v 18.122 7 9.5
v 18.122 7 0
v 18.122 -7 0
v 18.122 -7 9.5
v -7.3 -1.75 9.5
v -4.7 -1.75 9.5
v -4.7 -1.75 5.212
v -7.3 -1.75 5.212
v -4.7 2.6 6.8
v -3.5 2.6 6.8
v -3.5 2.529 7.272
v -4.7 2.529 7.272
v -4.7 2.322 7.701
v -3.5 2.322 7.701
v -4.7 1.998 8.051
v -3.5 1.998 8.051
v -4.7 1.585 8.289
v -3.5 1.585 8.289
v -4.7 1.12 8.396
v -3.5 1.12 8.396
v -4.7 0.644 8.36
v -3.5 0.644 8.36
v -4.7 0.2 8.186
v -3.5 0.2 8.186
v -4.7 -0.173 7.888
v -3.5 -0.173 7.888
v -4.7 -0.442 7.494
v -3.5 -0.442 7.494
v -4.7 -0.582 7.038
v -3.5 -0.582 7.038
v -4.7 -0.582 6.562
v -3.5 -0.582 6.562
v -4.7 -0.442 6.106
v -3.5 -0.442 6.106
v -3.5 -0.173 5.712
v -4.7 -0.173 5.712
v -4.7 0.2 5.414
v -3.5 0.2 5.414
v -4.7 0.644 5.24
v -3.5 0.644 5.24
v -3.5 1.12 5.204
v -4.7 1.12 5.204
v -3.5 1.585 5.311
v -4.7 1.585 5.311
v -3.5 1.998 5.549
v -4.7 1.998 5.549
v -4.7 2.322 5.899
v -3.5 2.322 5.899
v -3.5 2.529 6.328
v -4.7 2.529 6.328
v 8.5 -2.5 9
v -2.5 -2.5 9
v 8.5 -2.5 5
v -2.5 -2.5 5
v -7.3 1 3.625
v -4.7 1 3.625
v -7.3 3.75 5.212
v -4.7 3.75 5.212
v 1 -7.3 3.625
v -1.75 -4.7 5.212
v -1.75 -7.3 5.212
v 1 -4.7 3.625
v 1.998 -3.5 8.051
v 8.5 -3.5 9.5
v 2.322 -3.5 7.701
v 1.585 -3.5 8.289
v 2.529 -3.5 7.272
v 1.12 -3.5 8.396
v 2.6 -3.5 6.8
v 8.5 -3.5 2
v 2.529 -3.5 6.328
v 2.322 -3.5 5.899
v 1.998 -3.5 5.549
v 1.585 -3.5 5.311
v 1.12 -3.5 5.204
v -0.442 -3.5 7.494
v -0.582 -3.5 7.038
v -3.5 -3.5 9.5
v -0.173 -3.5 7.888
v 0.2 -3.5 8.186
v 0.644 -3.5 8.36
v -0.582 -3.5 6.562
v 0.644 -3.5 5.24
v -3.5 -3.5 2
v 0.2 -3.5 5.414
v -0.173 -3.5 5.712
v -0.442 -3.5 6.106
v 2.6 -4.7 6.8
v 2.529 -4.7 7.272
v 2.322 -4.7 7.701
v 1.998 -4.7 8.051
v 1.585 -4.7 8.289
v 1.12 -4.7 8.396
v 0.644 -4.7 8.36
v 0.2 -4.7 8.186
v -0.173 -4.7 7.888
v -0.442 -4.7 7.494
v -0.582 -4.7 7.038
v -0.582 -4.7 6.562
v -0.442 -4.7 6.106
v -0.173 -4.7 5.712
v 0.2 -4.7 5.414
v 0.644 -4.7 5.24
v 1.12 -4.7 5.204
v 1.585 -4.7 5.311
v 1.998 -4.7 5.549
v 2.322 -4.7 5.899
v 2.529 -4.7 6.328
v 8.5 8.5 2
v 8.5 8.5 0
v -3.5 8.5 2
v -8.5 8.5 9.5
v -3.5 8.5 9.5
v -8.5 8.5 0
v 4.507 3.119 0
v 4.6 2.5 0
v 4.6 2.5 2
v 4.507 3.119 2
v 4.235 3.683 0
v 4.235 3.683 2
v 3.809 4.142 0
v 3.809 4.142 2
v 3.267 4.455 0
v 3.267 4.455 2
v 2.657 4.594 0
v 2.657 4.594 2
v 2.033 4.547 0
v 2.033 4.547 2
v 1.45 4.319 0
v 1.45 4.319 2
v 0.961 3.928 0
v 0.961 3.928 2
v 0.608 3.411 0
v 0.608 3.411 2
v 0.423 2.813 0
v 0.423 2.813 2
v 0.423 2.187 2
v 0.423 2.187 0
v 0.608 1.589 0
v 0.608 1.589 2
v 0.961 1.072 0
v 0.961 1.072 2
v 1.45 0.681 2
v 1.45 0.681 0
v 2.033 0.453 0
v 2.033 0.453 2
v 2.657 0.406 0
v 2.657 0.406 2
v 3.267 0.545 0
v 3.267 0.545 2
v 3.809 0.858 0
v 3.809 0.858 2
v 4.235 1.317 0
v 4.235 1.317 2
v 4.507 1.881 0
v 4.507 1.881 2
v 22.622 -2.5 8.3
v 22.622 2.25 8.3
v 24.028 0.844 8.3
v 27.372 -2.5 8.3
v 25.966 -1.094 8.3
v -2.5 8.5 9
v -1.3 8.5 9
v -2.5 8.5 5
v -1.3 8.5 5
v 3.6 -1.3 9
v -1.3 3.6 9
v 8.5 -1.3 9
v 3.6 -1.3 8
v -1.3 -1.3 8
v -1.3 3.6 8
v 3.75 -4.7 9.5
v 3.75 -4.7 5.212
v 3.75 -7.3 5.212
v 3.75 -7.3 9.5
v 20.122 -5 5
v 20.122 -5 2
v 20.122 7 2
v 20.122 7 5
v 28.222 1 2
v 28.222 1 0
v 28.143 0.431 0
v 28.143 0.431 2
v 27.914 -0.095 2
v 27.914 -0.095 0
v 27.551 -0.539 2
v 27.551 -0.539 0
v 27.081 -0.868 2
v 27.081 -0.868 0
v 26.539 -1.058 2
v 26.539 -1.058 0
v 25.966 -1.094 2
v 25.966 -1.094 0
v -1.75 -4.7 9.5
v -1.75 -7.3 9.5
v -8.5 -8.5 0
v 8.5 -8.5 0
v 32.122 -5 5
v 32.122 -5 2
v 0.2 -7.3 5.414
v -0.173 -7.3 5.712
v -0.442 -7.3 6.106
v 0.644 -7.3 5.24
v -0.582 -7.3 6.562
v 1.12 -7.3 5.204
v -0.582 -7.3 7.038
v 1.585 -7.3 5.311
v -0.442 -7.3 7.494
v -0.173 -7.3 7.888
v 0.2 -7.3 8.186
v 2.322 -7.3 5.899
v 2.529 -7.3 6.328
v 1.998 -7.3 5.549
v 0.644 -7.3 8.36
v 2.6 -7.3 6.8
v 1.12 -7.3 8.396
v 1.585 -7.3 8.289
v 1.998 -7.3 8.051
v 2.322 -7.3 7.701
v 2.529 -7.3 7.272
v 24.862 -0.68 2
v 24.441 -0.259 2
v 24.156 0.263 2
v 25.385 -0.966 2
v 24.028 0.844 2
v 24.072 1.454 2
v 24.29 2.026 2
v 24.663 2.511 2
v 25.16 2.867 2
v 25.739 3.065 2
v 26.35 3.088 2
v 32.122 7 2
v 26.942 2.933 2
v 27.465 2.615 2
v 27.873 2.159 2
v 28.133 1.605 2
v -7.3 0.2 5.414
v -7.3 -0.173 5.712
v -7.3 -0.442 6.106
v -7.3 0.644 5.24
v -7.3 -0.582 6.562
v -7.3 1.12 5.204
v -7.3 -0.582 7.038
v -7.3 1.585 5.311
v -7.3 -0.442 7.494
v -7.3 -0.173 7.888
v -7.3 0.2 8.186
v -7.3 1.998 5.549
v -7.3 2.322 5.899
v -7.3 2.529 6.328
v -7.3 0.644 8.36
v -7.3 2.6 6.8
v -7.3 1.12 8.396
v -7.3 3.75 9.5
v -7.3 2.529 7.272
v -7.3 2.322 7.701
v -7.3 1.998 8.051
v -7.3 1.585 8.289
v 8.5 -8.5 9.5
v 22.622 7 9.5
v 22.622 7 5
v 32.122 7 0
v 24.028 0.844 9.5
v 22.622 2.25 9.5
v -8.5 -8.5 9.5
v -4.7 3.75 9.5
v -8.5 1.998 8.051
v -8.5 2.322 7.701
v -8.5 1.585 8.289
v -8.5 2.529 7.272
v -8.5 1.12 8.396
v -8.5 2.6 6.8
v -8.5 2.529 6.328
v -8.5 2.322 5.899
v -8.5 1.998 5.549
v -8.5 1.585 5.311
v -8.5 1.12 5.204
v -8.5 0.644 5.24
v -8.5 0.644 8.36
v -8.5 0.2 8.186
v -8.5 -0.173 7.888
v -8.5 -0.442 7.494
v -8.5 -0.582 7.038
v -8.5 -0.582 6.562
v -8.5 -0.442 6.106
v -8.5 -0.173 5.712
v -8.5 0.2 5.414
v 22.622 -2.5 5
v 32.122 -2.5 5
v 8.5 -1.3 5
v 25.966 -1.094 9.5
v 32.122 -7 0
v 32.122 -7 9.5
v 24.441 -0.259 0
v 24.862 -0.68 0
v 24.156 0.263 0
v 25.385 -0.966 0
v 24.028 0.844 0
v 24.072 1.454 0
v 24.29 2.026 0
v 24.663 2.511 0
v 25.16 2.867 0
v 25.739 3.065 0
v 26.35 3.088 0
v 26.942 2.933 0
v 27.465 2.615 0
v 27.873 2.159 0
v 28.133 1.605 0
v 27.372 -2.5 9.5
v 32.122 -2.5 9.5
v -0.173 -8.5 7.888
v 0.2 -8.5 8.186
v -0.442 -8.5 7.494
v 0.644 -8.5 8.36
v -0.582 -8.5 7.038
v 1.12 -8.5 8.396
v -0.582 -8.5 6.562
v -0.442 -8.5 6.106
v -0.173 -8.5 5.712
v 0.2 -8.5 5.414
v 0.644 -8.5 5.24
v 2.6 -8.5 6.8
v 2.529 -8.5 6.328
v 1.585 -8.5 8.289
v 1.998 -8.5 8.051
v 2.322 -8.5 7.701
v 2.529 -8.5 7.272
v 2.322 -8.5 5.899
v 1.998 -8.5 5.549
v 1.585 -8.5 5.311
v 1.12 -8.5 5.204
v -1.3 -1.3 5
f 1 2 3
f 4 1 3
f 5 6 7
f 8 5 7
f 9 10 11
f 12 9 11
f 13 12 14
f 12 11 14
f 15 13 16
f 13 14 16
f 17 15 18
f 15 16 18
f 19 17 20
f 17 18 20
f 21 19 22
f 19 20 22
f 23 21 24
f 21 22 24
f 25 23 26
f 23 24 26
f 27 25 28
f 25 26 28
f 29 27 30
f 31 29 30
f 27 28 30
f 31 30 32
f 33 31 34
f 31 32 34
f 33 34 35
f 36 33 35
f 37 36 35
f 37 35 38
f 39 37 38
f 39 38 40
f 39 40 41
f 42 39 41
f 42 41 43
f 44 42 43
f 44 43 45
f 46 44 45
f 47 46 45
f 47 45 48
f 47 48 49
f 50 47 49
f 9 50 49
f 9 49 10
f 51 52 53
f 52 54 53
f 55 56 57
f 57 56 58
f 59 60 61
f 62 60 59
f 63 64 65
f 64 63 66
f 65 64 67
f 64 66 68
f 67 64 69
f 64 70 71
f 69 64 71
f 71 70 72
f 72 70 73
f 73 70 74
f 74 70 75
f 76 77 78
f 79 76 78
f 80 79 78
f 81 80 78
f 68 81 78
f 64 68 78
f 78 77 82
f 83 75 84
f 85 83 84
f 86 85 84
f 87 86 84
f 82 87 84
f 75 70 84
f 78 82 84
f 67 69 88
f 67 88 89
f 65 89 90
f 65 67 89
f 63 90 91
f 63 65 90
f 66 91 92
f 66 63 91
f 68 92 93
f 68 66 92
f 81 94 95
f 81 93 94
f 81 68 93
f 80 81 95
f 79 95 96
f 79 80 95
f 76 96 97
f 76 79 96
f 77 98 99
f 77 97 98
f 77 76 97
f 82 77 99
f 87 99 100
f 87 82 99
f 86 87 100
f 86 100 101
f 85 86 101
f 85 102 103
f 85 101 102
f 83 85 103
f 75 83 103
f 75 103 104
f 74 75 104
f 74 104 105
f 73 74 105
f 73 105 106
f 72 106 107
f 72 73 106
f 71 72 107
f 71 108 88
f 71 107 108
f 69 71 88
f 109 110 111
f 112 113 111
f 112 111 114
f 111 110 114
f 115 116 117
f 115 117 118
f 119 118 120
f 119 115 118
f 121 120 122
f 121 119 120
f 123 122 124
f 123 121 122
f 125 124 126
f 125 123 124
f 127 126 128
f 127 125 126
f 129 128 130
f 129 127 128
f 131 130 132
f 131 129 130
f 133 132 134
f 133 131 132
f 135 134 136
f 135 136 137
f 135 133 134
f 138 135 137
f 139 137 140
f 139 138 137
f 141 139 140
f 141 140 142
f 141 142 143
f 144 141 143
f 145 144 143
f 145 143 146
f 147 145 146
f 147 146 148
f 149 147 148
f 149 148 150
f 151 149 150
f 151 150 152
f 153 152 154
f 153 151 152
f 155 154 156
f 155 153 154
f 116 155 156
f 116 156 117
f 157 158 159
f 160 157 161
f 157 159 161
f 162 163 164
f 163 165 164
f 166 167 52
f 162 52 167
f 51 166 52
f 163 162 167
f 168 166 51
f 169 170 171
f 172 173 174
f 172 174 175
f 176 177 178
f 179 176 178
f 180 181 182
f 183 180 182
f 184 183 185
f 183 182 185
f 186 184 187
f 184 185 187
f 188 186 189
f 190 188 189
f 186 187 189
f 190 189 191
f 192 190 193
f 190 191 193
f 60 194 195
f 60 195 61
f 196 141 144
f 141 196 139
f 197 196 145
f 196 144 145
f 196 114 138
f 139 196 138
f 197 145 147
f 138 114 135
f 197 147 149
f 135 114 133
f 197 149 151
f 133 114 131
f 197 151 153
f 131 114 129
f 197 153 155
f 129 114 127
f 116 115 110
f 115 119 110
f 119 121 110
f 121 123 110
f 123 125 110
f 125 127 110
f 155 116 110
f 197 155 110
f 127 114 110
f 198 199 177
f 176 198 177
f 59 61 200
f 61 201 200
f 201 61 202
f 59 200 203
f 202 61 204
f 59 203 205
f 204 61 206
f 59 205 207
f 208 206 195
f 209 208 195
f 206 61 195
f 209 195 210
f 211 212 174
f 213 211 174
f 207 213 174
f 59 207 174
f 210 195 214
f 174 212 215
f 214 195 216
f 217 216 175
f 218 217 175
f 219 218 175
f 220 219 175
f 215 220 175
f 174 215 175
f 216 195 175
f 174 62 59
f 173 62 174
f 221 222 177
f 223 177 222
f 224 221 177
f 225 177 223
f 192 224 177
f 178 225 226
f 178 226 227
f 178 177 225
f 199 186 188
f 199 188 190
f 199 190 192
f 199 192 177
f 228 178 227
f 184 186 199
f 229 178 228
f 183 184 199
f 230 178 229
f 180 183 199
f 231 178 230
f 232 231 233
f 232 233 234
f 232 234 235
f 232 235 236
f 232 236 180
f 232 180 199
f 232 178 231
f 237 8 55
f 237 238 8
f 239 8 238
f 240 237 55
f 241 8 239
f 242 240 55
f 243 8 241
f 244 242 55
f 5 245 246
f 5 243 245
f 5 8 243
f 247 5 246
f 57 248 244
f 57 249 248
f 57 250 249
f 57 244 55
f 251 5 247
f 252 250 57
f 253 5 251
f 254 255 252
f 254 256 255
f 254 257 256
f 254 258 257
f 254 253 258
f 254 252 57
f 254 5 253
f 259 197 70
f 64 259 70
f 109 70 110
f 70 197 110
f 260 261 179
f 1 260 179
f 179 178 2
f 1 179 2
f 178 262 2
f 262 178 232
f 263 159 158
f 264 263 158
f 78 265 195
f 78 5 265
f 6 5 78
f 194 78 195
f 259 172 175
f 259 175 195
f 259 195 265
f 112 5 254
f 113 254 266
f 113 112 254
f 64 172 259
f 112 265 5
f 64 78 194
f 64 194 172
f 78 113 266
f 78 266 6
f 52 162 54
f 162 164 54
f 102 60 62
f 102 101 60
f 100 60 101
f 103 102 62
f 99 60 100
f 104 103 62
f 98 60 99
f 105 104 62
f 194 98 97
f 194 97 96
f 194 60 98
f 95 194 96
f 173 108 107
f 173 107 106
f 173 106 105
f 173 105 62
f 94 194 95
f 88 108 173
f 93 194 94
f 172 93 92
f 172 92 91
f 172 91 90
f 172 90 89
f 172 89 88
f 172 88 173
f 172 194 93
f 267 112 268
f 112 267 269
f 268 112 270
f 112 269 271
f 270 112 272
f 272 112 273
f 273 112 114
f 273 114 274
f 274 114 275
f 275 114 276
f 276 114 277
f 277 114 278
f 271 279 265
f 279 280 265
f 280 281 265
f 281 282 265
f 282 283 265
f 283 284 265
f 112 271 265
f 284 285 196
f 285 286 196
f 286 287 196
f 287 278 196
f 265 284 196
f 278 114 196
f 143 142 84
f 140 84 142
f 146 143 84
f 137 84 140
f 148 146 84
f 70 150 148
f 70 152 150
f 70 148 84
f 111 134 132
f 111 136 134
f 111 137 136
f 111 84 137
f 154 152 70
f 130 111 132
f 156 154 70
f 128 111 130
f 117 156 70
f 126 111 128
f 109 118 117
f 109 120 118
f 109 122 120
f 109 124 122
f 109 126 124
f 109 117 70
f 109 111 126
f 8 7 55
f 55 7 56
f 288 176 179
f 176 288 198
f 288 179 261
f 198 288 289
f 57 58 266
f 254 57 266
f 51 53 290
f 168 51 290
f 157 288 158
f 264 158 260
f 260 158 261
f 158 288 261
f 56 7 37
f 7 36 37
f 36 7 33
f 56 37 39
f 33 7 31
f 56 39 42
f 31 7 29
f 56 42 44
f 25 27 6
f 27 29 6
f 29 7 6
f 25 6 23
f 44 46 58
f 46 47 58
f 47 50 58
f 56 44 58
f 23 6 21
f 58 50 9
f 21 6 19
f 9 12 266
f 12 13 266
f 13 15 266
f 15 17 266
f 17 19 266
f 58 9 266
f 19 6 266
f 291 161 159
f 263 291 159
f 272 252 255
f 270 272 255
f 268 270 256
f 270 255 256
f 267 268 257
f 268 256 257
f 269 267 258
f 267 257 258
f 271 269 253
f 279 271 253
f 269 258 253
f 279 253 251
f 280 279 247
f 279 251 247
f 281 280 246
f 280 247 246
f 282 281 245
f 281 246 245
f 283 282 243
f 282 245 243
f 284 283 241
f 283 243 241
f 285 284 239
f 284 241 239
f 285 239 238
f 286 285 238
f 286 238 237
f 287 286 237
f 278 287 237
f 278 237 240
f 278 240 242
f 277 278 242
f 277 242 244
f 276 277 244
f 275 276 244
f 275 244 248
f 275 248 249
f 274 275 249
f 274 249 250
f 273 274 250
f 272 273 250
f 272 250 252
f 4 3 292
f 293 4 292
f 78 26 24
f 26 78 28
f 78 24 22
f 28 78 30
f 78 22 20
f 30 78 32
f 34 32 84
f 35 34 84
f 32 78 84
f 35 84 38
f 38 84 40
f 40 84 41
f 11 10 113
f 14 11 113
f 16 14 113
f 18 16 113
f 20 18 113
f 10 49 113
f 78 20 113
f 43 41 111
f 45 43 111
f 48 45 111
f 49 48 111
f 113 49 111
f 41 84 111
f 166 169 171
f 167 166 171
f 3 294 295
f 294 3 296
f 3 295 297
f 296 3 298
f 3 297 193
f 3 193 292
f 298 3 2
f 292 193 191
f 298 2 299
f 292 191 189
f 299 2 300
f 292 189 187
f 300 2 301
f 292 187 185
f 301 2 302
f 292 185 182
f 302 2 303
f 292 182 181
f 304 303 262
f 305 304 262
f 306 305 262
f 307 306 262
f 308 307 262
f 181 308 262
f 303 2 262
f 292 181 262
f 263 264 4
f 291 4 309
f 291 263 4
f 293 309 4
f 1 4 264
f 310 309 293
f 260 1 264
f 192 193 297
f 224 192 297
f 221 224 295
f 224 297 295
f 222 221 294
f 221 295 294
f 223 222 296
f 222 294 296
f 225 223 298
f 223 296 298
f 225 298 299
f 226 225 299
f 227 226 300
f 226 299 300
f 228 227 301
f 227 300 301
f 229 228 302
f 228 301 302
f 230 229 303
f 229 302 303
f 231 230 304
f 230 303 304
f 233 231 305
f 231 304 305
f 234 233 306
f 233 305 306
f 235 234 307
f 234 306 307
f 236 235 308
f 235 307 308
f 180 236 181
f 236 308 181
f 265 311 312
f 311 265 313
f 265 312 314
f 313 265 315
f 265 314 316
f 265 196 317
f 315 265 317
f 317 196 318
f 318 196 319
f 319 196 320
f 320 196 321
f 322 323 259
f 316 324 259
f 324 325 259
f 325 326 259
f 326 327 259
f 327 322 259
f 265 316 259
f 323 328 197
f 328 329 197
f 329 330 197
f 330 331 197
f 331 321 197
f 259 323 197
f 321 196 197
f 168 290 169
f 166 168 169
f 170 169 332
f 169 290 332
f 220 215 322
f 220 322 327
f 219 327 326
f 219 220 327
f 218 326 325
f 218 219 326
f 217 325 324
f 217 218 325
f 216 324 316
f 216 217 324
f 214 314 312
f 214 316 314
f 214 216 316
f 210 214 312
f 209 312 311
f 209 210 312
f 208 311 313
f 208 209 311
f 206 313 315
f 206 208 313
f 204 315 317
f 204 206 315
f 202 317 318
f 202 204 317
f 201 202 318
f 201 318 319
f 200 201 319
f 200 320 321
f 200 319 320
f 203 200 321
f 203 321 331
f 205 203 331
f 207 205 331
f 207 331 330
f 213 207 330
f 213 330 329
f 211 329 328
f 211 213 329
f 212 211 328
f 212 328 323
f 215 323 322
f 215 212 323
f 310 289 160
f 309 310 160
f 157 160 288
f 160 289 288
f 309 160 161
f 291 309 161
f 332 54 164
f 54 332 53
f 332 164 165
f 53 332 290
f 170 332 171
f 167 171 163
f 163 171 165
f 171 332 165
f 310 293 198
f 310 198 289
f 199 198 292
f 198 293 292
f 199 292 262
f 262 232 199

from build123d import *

# Parameters (mm, degrees)
F0_W      = 5.8
F0_H      = 2.6
F0_W_2    = 2.6
F0_H_2    = 5.8
F0_W_3    = 12
F0_H_3    = 12
F0_R      = 2.1
F1_DEPTH  = 2
F2_DEPTH  = 9.5
F4_START  = 5
F4_DEPTH  = 3
F5_START  = 8
F5_DEPTH  = 1
F6_R      = 1.6
F7_DEPTH  = 8.501
F8_START  = -4.7
F8_DEPTH  = 2.6
F9_R      = 1.6
F10_DEPTH = 8.501
F11_START = 4.7
F11_DEPTH = 2.6
F13_DEPTH = 2
F14_DEPTH = 9.5
F15_START = 5
F15_DEPTH = 4.5
F16_START = 8.3
F16_DEPTH = 1.2


with BuildPart() as f1:
    # F0 (on Top) → F1 (new body)
    with BuildSketch(Plane.XY):
        Polygon((-3.5, 8.5), (-8.5, 8.5), (-8.5, -8.5), (8.5, -8.5), (8.5, -3.5), (-3.5, -3.5), align=None)
        with Locations((1, -6)):
            Rectangle(F0_W, F0_H, mode=Mode.SUBTRACT)
        with Locations((-6, 1)):
            Rectangle(F0_W_2, F0_H_2, mode=Mode.SUBTRACT)
        with Locations((2.5, 2.5)):
            Rectangle(F0_W_3, F0_H_3)
        with Locations((2.5, 2.5)):
            Circle(F0_R, mode=Mode.SUBTRACT)
        with Locations((-6, 1)):
            Rectangle(F0_W_2, F0_H_2)
        with Locations((1, -6)):
            Rectangle(F0_W, F0_H)
    extrude(amount=F1_DEPTH)

    # F0 (on Top) → F2 (join)
    with BuildSketch(Plane.XY):
        Polygon((-3.5, 8.5), (-8.5, 8.5), (-8.5, -8.5), (8.5, -8.5), (8.5, -3.5), (-3.5, -3.5), align=None)
        with Locations((1, -6)):
            Rectangle(F0_W, F0_H, mode=Mode.SUBTRACT)
        with Locations((-6, 1)):
            Rectangle(F0_W_2, F0_H_2, mode=Mode.SUBTRACT)
        with Locations((1, -6)):
            Rectangle(F0_W, F0_H)
        with Locations((-6, 1)):
            Rectangle(F0_W_2, F0_H_2)
    extrude(amount=F2_DEPTH)

    # F6 (on Right) → F7 (cut, through all)
    with BuildSketch(Plane.YZ):
        with Locations((1, 6.8)):
            Circle(F6_R)
    extrude(amount=-F7_DEPTH, mode=Mode.SUBTRACT)

    # F6 (on Right) → F8 (cut)
    with BuildSketch(Plane.YZ.offset(F8_START)):
        Polygon((3.75, 5.2122867597), (3.75, 8.3877132403), (1, 9.9754264805), (-1.75, 8.3877132403), (-1.75, 5.2122867597), (1, 3.6245735195), align=None)
        with Locations((1, 6.8)):
            Circle(F6_R, mode=Mode.SUBTRACT)
        Polygon((1, 9.9754264805), (3.75, 8.3877132403), (3.75, 9.9754264805), align=None)
        with Locations((1, 6.8)):
            Circle(F6_R)
        Polygon((-1.75, 8.3877132403), (1, 9.9754264805), (-1.75, 9.9754264805), align=None)
    extrude(amount=-F8_DEPTH, mode=Mode.SUBTRACT)

    # F9 (on Front) → F10 (cut, through all)
    with BuildSketch(Plane.XZ):
        with Locations((1, 6.8)):
            Circle(F9_R)
    extrude(amount=F10_DEPTH, mode=Mode.SUBTRACT)

    # F9 (on Front) → F11 (cut)
    with BuildSketch(Plane.XZ.offset(F11_START)):
        Polygon((-1.75, 8.3877132403), (-1.75, 5.2122867597), (1, 3.6245735195), (3.75, 5.2122867597), (3.75, 8.3877132403), (1, 9.9754264805), align=None)
        with Locations((1, 6.8)):
            Circle(F9_R, mode=Mode.SUBTRACT)
        Polygon((-1.75, 9.9754264805), (-1.75, 8.3877132403), (1, 9.9754264805), align=None)
        Polygon((3.75, 9.9754264805), (1, 9.9754264805), (3.75, 8.3877132403), align=None)
        with Locations((1, 6.8)):
            Circle(F9_R)
    extrude(amount=F11_DEPTH, mode=Mode.SUBTRACT)


with BuildPart() as f4:
    # F3 (on Top) → F4 (new body)
    with BuildSketch(Plane.XY.offset(F4_START)):
        Polygon((-1.3, 8.5), (-2.5, 8.5), (-2.5, -2.5), (8.5, -2.5), (8.5, -1.3), (3.6, -1.3), (-1.3, -1.3), (-1.3, 3.6), align=None)
    extrude(amount=F4_DEPTH)

    # F3 (on Top) → F5 (join)
    with BuildSketch(Plane.XY.offset(F5_START)):
        Polygon((3.6, -1.3), (-1.3, 3.6), (-1.3, -1.3), align=None)
        Polygon((-1.3, 8.5), (-2.5, 8.5), (-2.5, -2.5), (8.5, -2.5), (8.5, -1.3), (3.6, -1.3), (-1.3, -1.3), (-1.3, 3.6), align=None)
    extrude(amount=F5_DEPTH)


with BuildPart() as f13:
    # F12 (on Top) → F13 (new body)
    with BuildSketch(Plane.XY):
        with BuildLine():
            Line((24.0276748771, 0.8442135987), (22.6218884758, 2.25))
            Line((22.6218884758, 2.25), (22.6218884758, -2.5))
            Line((22.6218884758, -2.5), (27.3718884758, -2.5))
            Line((27.3718884758, -2.5), (25.9661020746, -1.0942135987))
            ThreePointArc((25.9661020746, -1.0942135987), (24.6369642353, -0.4849242405), (24.0276748771, 0.8442135987))
        make_face()
        with BuildLine():
            Line((32.1218884758, 7), (22.6218884758, 7))
            Line((22.6218884758, 7), (22.6218884758, 2.25))
            Line((22.6218884758, 2.25), (24.0276748771, 0.8442135987))
            ThreePointArc((24.0276748771, 0.8442135987), (26.0439415624, 3.0985529011), (28.2218884758, 1))
            ThreePointArc((28.2218884758, 1), (27.5506726718, -0.5390177781), (25.9661020746, -1.0942135987))
            Line((25.9661020746, -1.0942135987), (27.3718884758, -2.5))
            Line((27.3718884758, -2.5), (32.1218884758, -2.5))
            Line((32.1218884758, -2.5), (32.1218884758, 7))
        make_face()
        Polygon((20.1218884758, 7), (18.1218884758, 7), (18.1218884758, -7), (32.1218884758, -7), (32.1218884758, -5), (20.1218884758, -5), align=None)
        Polygon((22.6218884758, 7), (20.1218884758, 7), (20.1218884758, -5), (32.1218884758, -5), (32.1218884758, -2.5), (27.3718884758, -2.5), (22.6218884758, -2.5), (22.6218884758, 2.25), align=None)
    extrude(amount=F13_DEPTH)

    # F12 (on Top) → F14 (join)
    with BuildSketch(Plane.XY):
        Polygon((20.1218884758, 7), (18.1218884758, 7), (18.1218884758, -7), (32.1218884758, -7), (32.1218884758, -5), (20.1218884758, -5), align=None)
    extrude(amount=F14_DEPTH)

    # F12 (on Top) → F15 (join)
    with BuildSketch(Plane.XY.offset(F15_START)):
        Polygon((22.6218884758, 7), (20.1218884758, 7), (20.1218884758, -5), (32.1218884758, -5), (32.1218884758, -2.5), (27.3718884758, -2.5), (22.6218884758, -2.5), (22.6218884758, 2.25), align=None)
    extrude(amount=F15_DEPTH)

    # F12 (on Top) → F16 (join)
    with BuildSketch(Plane.XY.offset(F16_START)):
        with BuildLine():
            Line((24.0276748771, 0.8442135987), (22.6218884758, 2.25))
            Line((22.6218884758, 2.25), (22.6218884758, -2.5))
            Line((22.6218884758, -2.5), (27.3718884758, -2.5))
            Line((27.3718884758, -2.5), (25.9661020746, -1.0942135987))
            ThreePointArc((25.9661020746, -1.0942135987), (24.6369642353, -0.4849242405), (24.0276748771, 0.8442135987))
        make_face()
        with BuildLine():
            Line((25.9661020746, -1.0942135987), (24.0276748771, 0.8442135987))
            ThreePointArc((24.0276748771, 0.8442135987), (24.6369642353, -0.4849242405), (25.9661020746, -1.0942135987))
        make_face()
    extrude(amount=F16_DEPTH)


solid = Compound([f1.part, f4.part, f13.part])
